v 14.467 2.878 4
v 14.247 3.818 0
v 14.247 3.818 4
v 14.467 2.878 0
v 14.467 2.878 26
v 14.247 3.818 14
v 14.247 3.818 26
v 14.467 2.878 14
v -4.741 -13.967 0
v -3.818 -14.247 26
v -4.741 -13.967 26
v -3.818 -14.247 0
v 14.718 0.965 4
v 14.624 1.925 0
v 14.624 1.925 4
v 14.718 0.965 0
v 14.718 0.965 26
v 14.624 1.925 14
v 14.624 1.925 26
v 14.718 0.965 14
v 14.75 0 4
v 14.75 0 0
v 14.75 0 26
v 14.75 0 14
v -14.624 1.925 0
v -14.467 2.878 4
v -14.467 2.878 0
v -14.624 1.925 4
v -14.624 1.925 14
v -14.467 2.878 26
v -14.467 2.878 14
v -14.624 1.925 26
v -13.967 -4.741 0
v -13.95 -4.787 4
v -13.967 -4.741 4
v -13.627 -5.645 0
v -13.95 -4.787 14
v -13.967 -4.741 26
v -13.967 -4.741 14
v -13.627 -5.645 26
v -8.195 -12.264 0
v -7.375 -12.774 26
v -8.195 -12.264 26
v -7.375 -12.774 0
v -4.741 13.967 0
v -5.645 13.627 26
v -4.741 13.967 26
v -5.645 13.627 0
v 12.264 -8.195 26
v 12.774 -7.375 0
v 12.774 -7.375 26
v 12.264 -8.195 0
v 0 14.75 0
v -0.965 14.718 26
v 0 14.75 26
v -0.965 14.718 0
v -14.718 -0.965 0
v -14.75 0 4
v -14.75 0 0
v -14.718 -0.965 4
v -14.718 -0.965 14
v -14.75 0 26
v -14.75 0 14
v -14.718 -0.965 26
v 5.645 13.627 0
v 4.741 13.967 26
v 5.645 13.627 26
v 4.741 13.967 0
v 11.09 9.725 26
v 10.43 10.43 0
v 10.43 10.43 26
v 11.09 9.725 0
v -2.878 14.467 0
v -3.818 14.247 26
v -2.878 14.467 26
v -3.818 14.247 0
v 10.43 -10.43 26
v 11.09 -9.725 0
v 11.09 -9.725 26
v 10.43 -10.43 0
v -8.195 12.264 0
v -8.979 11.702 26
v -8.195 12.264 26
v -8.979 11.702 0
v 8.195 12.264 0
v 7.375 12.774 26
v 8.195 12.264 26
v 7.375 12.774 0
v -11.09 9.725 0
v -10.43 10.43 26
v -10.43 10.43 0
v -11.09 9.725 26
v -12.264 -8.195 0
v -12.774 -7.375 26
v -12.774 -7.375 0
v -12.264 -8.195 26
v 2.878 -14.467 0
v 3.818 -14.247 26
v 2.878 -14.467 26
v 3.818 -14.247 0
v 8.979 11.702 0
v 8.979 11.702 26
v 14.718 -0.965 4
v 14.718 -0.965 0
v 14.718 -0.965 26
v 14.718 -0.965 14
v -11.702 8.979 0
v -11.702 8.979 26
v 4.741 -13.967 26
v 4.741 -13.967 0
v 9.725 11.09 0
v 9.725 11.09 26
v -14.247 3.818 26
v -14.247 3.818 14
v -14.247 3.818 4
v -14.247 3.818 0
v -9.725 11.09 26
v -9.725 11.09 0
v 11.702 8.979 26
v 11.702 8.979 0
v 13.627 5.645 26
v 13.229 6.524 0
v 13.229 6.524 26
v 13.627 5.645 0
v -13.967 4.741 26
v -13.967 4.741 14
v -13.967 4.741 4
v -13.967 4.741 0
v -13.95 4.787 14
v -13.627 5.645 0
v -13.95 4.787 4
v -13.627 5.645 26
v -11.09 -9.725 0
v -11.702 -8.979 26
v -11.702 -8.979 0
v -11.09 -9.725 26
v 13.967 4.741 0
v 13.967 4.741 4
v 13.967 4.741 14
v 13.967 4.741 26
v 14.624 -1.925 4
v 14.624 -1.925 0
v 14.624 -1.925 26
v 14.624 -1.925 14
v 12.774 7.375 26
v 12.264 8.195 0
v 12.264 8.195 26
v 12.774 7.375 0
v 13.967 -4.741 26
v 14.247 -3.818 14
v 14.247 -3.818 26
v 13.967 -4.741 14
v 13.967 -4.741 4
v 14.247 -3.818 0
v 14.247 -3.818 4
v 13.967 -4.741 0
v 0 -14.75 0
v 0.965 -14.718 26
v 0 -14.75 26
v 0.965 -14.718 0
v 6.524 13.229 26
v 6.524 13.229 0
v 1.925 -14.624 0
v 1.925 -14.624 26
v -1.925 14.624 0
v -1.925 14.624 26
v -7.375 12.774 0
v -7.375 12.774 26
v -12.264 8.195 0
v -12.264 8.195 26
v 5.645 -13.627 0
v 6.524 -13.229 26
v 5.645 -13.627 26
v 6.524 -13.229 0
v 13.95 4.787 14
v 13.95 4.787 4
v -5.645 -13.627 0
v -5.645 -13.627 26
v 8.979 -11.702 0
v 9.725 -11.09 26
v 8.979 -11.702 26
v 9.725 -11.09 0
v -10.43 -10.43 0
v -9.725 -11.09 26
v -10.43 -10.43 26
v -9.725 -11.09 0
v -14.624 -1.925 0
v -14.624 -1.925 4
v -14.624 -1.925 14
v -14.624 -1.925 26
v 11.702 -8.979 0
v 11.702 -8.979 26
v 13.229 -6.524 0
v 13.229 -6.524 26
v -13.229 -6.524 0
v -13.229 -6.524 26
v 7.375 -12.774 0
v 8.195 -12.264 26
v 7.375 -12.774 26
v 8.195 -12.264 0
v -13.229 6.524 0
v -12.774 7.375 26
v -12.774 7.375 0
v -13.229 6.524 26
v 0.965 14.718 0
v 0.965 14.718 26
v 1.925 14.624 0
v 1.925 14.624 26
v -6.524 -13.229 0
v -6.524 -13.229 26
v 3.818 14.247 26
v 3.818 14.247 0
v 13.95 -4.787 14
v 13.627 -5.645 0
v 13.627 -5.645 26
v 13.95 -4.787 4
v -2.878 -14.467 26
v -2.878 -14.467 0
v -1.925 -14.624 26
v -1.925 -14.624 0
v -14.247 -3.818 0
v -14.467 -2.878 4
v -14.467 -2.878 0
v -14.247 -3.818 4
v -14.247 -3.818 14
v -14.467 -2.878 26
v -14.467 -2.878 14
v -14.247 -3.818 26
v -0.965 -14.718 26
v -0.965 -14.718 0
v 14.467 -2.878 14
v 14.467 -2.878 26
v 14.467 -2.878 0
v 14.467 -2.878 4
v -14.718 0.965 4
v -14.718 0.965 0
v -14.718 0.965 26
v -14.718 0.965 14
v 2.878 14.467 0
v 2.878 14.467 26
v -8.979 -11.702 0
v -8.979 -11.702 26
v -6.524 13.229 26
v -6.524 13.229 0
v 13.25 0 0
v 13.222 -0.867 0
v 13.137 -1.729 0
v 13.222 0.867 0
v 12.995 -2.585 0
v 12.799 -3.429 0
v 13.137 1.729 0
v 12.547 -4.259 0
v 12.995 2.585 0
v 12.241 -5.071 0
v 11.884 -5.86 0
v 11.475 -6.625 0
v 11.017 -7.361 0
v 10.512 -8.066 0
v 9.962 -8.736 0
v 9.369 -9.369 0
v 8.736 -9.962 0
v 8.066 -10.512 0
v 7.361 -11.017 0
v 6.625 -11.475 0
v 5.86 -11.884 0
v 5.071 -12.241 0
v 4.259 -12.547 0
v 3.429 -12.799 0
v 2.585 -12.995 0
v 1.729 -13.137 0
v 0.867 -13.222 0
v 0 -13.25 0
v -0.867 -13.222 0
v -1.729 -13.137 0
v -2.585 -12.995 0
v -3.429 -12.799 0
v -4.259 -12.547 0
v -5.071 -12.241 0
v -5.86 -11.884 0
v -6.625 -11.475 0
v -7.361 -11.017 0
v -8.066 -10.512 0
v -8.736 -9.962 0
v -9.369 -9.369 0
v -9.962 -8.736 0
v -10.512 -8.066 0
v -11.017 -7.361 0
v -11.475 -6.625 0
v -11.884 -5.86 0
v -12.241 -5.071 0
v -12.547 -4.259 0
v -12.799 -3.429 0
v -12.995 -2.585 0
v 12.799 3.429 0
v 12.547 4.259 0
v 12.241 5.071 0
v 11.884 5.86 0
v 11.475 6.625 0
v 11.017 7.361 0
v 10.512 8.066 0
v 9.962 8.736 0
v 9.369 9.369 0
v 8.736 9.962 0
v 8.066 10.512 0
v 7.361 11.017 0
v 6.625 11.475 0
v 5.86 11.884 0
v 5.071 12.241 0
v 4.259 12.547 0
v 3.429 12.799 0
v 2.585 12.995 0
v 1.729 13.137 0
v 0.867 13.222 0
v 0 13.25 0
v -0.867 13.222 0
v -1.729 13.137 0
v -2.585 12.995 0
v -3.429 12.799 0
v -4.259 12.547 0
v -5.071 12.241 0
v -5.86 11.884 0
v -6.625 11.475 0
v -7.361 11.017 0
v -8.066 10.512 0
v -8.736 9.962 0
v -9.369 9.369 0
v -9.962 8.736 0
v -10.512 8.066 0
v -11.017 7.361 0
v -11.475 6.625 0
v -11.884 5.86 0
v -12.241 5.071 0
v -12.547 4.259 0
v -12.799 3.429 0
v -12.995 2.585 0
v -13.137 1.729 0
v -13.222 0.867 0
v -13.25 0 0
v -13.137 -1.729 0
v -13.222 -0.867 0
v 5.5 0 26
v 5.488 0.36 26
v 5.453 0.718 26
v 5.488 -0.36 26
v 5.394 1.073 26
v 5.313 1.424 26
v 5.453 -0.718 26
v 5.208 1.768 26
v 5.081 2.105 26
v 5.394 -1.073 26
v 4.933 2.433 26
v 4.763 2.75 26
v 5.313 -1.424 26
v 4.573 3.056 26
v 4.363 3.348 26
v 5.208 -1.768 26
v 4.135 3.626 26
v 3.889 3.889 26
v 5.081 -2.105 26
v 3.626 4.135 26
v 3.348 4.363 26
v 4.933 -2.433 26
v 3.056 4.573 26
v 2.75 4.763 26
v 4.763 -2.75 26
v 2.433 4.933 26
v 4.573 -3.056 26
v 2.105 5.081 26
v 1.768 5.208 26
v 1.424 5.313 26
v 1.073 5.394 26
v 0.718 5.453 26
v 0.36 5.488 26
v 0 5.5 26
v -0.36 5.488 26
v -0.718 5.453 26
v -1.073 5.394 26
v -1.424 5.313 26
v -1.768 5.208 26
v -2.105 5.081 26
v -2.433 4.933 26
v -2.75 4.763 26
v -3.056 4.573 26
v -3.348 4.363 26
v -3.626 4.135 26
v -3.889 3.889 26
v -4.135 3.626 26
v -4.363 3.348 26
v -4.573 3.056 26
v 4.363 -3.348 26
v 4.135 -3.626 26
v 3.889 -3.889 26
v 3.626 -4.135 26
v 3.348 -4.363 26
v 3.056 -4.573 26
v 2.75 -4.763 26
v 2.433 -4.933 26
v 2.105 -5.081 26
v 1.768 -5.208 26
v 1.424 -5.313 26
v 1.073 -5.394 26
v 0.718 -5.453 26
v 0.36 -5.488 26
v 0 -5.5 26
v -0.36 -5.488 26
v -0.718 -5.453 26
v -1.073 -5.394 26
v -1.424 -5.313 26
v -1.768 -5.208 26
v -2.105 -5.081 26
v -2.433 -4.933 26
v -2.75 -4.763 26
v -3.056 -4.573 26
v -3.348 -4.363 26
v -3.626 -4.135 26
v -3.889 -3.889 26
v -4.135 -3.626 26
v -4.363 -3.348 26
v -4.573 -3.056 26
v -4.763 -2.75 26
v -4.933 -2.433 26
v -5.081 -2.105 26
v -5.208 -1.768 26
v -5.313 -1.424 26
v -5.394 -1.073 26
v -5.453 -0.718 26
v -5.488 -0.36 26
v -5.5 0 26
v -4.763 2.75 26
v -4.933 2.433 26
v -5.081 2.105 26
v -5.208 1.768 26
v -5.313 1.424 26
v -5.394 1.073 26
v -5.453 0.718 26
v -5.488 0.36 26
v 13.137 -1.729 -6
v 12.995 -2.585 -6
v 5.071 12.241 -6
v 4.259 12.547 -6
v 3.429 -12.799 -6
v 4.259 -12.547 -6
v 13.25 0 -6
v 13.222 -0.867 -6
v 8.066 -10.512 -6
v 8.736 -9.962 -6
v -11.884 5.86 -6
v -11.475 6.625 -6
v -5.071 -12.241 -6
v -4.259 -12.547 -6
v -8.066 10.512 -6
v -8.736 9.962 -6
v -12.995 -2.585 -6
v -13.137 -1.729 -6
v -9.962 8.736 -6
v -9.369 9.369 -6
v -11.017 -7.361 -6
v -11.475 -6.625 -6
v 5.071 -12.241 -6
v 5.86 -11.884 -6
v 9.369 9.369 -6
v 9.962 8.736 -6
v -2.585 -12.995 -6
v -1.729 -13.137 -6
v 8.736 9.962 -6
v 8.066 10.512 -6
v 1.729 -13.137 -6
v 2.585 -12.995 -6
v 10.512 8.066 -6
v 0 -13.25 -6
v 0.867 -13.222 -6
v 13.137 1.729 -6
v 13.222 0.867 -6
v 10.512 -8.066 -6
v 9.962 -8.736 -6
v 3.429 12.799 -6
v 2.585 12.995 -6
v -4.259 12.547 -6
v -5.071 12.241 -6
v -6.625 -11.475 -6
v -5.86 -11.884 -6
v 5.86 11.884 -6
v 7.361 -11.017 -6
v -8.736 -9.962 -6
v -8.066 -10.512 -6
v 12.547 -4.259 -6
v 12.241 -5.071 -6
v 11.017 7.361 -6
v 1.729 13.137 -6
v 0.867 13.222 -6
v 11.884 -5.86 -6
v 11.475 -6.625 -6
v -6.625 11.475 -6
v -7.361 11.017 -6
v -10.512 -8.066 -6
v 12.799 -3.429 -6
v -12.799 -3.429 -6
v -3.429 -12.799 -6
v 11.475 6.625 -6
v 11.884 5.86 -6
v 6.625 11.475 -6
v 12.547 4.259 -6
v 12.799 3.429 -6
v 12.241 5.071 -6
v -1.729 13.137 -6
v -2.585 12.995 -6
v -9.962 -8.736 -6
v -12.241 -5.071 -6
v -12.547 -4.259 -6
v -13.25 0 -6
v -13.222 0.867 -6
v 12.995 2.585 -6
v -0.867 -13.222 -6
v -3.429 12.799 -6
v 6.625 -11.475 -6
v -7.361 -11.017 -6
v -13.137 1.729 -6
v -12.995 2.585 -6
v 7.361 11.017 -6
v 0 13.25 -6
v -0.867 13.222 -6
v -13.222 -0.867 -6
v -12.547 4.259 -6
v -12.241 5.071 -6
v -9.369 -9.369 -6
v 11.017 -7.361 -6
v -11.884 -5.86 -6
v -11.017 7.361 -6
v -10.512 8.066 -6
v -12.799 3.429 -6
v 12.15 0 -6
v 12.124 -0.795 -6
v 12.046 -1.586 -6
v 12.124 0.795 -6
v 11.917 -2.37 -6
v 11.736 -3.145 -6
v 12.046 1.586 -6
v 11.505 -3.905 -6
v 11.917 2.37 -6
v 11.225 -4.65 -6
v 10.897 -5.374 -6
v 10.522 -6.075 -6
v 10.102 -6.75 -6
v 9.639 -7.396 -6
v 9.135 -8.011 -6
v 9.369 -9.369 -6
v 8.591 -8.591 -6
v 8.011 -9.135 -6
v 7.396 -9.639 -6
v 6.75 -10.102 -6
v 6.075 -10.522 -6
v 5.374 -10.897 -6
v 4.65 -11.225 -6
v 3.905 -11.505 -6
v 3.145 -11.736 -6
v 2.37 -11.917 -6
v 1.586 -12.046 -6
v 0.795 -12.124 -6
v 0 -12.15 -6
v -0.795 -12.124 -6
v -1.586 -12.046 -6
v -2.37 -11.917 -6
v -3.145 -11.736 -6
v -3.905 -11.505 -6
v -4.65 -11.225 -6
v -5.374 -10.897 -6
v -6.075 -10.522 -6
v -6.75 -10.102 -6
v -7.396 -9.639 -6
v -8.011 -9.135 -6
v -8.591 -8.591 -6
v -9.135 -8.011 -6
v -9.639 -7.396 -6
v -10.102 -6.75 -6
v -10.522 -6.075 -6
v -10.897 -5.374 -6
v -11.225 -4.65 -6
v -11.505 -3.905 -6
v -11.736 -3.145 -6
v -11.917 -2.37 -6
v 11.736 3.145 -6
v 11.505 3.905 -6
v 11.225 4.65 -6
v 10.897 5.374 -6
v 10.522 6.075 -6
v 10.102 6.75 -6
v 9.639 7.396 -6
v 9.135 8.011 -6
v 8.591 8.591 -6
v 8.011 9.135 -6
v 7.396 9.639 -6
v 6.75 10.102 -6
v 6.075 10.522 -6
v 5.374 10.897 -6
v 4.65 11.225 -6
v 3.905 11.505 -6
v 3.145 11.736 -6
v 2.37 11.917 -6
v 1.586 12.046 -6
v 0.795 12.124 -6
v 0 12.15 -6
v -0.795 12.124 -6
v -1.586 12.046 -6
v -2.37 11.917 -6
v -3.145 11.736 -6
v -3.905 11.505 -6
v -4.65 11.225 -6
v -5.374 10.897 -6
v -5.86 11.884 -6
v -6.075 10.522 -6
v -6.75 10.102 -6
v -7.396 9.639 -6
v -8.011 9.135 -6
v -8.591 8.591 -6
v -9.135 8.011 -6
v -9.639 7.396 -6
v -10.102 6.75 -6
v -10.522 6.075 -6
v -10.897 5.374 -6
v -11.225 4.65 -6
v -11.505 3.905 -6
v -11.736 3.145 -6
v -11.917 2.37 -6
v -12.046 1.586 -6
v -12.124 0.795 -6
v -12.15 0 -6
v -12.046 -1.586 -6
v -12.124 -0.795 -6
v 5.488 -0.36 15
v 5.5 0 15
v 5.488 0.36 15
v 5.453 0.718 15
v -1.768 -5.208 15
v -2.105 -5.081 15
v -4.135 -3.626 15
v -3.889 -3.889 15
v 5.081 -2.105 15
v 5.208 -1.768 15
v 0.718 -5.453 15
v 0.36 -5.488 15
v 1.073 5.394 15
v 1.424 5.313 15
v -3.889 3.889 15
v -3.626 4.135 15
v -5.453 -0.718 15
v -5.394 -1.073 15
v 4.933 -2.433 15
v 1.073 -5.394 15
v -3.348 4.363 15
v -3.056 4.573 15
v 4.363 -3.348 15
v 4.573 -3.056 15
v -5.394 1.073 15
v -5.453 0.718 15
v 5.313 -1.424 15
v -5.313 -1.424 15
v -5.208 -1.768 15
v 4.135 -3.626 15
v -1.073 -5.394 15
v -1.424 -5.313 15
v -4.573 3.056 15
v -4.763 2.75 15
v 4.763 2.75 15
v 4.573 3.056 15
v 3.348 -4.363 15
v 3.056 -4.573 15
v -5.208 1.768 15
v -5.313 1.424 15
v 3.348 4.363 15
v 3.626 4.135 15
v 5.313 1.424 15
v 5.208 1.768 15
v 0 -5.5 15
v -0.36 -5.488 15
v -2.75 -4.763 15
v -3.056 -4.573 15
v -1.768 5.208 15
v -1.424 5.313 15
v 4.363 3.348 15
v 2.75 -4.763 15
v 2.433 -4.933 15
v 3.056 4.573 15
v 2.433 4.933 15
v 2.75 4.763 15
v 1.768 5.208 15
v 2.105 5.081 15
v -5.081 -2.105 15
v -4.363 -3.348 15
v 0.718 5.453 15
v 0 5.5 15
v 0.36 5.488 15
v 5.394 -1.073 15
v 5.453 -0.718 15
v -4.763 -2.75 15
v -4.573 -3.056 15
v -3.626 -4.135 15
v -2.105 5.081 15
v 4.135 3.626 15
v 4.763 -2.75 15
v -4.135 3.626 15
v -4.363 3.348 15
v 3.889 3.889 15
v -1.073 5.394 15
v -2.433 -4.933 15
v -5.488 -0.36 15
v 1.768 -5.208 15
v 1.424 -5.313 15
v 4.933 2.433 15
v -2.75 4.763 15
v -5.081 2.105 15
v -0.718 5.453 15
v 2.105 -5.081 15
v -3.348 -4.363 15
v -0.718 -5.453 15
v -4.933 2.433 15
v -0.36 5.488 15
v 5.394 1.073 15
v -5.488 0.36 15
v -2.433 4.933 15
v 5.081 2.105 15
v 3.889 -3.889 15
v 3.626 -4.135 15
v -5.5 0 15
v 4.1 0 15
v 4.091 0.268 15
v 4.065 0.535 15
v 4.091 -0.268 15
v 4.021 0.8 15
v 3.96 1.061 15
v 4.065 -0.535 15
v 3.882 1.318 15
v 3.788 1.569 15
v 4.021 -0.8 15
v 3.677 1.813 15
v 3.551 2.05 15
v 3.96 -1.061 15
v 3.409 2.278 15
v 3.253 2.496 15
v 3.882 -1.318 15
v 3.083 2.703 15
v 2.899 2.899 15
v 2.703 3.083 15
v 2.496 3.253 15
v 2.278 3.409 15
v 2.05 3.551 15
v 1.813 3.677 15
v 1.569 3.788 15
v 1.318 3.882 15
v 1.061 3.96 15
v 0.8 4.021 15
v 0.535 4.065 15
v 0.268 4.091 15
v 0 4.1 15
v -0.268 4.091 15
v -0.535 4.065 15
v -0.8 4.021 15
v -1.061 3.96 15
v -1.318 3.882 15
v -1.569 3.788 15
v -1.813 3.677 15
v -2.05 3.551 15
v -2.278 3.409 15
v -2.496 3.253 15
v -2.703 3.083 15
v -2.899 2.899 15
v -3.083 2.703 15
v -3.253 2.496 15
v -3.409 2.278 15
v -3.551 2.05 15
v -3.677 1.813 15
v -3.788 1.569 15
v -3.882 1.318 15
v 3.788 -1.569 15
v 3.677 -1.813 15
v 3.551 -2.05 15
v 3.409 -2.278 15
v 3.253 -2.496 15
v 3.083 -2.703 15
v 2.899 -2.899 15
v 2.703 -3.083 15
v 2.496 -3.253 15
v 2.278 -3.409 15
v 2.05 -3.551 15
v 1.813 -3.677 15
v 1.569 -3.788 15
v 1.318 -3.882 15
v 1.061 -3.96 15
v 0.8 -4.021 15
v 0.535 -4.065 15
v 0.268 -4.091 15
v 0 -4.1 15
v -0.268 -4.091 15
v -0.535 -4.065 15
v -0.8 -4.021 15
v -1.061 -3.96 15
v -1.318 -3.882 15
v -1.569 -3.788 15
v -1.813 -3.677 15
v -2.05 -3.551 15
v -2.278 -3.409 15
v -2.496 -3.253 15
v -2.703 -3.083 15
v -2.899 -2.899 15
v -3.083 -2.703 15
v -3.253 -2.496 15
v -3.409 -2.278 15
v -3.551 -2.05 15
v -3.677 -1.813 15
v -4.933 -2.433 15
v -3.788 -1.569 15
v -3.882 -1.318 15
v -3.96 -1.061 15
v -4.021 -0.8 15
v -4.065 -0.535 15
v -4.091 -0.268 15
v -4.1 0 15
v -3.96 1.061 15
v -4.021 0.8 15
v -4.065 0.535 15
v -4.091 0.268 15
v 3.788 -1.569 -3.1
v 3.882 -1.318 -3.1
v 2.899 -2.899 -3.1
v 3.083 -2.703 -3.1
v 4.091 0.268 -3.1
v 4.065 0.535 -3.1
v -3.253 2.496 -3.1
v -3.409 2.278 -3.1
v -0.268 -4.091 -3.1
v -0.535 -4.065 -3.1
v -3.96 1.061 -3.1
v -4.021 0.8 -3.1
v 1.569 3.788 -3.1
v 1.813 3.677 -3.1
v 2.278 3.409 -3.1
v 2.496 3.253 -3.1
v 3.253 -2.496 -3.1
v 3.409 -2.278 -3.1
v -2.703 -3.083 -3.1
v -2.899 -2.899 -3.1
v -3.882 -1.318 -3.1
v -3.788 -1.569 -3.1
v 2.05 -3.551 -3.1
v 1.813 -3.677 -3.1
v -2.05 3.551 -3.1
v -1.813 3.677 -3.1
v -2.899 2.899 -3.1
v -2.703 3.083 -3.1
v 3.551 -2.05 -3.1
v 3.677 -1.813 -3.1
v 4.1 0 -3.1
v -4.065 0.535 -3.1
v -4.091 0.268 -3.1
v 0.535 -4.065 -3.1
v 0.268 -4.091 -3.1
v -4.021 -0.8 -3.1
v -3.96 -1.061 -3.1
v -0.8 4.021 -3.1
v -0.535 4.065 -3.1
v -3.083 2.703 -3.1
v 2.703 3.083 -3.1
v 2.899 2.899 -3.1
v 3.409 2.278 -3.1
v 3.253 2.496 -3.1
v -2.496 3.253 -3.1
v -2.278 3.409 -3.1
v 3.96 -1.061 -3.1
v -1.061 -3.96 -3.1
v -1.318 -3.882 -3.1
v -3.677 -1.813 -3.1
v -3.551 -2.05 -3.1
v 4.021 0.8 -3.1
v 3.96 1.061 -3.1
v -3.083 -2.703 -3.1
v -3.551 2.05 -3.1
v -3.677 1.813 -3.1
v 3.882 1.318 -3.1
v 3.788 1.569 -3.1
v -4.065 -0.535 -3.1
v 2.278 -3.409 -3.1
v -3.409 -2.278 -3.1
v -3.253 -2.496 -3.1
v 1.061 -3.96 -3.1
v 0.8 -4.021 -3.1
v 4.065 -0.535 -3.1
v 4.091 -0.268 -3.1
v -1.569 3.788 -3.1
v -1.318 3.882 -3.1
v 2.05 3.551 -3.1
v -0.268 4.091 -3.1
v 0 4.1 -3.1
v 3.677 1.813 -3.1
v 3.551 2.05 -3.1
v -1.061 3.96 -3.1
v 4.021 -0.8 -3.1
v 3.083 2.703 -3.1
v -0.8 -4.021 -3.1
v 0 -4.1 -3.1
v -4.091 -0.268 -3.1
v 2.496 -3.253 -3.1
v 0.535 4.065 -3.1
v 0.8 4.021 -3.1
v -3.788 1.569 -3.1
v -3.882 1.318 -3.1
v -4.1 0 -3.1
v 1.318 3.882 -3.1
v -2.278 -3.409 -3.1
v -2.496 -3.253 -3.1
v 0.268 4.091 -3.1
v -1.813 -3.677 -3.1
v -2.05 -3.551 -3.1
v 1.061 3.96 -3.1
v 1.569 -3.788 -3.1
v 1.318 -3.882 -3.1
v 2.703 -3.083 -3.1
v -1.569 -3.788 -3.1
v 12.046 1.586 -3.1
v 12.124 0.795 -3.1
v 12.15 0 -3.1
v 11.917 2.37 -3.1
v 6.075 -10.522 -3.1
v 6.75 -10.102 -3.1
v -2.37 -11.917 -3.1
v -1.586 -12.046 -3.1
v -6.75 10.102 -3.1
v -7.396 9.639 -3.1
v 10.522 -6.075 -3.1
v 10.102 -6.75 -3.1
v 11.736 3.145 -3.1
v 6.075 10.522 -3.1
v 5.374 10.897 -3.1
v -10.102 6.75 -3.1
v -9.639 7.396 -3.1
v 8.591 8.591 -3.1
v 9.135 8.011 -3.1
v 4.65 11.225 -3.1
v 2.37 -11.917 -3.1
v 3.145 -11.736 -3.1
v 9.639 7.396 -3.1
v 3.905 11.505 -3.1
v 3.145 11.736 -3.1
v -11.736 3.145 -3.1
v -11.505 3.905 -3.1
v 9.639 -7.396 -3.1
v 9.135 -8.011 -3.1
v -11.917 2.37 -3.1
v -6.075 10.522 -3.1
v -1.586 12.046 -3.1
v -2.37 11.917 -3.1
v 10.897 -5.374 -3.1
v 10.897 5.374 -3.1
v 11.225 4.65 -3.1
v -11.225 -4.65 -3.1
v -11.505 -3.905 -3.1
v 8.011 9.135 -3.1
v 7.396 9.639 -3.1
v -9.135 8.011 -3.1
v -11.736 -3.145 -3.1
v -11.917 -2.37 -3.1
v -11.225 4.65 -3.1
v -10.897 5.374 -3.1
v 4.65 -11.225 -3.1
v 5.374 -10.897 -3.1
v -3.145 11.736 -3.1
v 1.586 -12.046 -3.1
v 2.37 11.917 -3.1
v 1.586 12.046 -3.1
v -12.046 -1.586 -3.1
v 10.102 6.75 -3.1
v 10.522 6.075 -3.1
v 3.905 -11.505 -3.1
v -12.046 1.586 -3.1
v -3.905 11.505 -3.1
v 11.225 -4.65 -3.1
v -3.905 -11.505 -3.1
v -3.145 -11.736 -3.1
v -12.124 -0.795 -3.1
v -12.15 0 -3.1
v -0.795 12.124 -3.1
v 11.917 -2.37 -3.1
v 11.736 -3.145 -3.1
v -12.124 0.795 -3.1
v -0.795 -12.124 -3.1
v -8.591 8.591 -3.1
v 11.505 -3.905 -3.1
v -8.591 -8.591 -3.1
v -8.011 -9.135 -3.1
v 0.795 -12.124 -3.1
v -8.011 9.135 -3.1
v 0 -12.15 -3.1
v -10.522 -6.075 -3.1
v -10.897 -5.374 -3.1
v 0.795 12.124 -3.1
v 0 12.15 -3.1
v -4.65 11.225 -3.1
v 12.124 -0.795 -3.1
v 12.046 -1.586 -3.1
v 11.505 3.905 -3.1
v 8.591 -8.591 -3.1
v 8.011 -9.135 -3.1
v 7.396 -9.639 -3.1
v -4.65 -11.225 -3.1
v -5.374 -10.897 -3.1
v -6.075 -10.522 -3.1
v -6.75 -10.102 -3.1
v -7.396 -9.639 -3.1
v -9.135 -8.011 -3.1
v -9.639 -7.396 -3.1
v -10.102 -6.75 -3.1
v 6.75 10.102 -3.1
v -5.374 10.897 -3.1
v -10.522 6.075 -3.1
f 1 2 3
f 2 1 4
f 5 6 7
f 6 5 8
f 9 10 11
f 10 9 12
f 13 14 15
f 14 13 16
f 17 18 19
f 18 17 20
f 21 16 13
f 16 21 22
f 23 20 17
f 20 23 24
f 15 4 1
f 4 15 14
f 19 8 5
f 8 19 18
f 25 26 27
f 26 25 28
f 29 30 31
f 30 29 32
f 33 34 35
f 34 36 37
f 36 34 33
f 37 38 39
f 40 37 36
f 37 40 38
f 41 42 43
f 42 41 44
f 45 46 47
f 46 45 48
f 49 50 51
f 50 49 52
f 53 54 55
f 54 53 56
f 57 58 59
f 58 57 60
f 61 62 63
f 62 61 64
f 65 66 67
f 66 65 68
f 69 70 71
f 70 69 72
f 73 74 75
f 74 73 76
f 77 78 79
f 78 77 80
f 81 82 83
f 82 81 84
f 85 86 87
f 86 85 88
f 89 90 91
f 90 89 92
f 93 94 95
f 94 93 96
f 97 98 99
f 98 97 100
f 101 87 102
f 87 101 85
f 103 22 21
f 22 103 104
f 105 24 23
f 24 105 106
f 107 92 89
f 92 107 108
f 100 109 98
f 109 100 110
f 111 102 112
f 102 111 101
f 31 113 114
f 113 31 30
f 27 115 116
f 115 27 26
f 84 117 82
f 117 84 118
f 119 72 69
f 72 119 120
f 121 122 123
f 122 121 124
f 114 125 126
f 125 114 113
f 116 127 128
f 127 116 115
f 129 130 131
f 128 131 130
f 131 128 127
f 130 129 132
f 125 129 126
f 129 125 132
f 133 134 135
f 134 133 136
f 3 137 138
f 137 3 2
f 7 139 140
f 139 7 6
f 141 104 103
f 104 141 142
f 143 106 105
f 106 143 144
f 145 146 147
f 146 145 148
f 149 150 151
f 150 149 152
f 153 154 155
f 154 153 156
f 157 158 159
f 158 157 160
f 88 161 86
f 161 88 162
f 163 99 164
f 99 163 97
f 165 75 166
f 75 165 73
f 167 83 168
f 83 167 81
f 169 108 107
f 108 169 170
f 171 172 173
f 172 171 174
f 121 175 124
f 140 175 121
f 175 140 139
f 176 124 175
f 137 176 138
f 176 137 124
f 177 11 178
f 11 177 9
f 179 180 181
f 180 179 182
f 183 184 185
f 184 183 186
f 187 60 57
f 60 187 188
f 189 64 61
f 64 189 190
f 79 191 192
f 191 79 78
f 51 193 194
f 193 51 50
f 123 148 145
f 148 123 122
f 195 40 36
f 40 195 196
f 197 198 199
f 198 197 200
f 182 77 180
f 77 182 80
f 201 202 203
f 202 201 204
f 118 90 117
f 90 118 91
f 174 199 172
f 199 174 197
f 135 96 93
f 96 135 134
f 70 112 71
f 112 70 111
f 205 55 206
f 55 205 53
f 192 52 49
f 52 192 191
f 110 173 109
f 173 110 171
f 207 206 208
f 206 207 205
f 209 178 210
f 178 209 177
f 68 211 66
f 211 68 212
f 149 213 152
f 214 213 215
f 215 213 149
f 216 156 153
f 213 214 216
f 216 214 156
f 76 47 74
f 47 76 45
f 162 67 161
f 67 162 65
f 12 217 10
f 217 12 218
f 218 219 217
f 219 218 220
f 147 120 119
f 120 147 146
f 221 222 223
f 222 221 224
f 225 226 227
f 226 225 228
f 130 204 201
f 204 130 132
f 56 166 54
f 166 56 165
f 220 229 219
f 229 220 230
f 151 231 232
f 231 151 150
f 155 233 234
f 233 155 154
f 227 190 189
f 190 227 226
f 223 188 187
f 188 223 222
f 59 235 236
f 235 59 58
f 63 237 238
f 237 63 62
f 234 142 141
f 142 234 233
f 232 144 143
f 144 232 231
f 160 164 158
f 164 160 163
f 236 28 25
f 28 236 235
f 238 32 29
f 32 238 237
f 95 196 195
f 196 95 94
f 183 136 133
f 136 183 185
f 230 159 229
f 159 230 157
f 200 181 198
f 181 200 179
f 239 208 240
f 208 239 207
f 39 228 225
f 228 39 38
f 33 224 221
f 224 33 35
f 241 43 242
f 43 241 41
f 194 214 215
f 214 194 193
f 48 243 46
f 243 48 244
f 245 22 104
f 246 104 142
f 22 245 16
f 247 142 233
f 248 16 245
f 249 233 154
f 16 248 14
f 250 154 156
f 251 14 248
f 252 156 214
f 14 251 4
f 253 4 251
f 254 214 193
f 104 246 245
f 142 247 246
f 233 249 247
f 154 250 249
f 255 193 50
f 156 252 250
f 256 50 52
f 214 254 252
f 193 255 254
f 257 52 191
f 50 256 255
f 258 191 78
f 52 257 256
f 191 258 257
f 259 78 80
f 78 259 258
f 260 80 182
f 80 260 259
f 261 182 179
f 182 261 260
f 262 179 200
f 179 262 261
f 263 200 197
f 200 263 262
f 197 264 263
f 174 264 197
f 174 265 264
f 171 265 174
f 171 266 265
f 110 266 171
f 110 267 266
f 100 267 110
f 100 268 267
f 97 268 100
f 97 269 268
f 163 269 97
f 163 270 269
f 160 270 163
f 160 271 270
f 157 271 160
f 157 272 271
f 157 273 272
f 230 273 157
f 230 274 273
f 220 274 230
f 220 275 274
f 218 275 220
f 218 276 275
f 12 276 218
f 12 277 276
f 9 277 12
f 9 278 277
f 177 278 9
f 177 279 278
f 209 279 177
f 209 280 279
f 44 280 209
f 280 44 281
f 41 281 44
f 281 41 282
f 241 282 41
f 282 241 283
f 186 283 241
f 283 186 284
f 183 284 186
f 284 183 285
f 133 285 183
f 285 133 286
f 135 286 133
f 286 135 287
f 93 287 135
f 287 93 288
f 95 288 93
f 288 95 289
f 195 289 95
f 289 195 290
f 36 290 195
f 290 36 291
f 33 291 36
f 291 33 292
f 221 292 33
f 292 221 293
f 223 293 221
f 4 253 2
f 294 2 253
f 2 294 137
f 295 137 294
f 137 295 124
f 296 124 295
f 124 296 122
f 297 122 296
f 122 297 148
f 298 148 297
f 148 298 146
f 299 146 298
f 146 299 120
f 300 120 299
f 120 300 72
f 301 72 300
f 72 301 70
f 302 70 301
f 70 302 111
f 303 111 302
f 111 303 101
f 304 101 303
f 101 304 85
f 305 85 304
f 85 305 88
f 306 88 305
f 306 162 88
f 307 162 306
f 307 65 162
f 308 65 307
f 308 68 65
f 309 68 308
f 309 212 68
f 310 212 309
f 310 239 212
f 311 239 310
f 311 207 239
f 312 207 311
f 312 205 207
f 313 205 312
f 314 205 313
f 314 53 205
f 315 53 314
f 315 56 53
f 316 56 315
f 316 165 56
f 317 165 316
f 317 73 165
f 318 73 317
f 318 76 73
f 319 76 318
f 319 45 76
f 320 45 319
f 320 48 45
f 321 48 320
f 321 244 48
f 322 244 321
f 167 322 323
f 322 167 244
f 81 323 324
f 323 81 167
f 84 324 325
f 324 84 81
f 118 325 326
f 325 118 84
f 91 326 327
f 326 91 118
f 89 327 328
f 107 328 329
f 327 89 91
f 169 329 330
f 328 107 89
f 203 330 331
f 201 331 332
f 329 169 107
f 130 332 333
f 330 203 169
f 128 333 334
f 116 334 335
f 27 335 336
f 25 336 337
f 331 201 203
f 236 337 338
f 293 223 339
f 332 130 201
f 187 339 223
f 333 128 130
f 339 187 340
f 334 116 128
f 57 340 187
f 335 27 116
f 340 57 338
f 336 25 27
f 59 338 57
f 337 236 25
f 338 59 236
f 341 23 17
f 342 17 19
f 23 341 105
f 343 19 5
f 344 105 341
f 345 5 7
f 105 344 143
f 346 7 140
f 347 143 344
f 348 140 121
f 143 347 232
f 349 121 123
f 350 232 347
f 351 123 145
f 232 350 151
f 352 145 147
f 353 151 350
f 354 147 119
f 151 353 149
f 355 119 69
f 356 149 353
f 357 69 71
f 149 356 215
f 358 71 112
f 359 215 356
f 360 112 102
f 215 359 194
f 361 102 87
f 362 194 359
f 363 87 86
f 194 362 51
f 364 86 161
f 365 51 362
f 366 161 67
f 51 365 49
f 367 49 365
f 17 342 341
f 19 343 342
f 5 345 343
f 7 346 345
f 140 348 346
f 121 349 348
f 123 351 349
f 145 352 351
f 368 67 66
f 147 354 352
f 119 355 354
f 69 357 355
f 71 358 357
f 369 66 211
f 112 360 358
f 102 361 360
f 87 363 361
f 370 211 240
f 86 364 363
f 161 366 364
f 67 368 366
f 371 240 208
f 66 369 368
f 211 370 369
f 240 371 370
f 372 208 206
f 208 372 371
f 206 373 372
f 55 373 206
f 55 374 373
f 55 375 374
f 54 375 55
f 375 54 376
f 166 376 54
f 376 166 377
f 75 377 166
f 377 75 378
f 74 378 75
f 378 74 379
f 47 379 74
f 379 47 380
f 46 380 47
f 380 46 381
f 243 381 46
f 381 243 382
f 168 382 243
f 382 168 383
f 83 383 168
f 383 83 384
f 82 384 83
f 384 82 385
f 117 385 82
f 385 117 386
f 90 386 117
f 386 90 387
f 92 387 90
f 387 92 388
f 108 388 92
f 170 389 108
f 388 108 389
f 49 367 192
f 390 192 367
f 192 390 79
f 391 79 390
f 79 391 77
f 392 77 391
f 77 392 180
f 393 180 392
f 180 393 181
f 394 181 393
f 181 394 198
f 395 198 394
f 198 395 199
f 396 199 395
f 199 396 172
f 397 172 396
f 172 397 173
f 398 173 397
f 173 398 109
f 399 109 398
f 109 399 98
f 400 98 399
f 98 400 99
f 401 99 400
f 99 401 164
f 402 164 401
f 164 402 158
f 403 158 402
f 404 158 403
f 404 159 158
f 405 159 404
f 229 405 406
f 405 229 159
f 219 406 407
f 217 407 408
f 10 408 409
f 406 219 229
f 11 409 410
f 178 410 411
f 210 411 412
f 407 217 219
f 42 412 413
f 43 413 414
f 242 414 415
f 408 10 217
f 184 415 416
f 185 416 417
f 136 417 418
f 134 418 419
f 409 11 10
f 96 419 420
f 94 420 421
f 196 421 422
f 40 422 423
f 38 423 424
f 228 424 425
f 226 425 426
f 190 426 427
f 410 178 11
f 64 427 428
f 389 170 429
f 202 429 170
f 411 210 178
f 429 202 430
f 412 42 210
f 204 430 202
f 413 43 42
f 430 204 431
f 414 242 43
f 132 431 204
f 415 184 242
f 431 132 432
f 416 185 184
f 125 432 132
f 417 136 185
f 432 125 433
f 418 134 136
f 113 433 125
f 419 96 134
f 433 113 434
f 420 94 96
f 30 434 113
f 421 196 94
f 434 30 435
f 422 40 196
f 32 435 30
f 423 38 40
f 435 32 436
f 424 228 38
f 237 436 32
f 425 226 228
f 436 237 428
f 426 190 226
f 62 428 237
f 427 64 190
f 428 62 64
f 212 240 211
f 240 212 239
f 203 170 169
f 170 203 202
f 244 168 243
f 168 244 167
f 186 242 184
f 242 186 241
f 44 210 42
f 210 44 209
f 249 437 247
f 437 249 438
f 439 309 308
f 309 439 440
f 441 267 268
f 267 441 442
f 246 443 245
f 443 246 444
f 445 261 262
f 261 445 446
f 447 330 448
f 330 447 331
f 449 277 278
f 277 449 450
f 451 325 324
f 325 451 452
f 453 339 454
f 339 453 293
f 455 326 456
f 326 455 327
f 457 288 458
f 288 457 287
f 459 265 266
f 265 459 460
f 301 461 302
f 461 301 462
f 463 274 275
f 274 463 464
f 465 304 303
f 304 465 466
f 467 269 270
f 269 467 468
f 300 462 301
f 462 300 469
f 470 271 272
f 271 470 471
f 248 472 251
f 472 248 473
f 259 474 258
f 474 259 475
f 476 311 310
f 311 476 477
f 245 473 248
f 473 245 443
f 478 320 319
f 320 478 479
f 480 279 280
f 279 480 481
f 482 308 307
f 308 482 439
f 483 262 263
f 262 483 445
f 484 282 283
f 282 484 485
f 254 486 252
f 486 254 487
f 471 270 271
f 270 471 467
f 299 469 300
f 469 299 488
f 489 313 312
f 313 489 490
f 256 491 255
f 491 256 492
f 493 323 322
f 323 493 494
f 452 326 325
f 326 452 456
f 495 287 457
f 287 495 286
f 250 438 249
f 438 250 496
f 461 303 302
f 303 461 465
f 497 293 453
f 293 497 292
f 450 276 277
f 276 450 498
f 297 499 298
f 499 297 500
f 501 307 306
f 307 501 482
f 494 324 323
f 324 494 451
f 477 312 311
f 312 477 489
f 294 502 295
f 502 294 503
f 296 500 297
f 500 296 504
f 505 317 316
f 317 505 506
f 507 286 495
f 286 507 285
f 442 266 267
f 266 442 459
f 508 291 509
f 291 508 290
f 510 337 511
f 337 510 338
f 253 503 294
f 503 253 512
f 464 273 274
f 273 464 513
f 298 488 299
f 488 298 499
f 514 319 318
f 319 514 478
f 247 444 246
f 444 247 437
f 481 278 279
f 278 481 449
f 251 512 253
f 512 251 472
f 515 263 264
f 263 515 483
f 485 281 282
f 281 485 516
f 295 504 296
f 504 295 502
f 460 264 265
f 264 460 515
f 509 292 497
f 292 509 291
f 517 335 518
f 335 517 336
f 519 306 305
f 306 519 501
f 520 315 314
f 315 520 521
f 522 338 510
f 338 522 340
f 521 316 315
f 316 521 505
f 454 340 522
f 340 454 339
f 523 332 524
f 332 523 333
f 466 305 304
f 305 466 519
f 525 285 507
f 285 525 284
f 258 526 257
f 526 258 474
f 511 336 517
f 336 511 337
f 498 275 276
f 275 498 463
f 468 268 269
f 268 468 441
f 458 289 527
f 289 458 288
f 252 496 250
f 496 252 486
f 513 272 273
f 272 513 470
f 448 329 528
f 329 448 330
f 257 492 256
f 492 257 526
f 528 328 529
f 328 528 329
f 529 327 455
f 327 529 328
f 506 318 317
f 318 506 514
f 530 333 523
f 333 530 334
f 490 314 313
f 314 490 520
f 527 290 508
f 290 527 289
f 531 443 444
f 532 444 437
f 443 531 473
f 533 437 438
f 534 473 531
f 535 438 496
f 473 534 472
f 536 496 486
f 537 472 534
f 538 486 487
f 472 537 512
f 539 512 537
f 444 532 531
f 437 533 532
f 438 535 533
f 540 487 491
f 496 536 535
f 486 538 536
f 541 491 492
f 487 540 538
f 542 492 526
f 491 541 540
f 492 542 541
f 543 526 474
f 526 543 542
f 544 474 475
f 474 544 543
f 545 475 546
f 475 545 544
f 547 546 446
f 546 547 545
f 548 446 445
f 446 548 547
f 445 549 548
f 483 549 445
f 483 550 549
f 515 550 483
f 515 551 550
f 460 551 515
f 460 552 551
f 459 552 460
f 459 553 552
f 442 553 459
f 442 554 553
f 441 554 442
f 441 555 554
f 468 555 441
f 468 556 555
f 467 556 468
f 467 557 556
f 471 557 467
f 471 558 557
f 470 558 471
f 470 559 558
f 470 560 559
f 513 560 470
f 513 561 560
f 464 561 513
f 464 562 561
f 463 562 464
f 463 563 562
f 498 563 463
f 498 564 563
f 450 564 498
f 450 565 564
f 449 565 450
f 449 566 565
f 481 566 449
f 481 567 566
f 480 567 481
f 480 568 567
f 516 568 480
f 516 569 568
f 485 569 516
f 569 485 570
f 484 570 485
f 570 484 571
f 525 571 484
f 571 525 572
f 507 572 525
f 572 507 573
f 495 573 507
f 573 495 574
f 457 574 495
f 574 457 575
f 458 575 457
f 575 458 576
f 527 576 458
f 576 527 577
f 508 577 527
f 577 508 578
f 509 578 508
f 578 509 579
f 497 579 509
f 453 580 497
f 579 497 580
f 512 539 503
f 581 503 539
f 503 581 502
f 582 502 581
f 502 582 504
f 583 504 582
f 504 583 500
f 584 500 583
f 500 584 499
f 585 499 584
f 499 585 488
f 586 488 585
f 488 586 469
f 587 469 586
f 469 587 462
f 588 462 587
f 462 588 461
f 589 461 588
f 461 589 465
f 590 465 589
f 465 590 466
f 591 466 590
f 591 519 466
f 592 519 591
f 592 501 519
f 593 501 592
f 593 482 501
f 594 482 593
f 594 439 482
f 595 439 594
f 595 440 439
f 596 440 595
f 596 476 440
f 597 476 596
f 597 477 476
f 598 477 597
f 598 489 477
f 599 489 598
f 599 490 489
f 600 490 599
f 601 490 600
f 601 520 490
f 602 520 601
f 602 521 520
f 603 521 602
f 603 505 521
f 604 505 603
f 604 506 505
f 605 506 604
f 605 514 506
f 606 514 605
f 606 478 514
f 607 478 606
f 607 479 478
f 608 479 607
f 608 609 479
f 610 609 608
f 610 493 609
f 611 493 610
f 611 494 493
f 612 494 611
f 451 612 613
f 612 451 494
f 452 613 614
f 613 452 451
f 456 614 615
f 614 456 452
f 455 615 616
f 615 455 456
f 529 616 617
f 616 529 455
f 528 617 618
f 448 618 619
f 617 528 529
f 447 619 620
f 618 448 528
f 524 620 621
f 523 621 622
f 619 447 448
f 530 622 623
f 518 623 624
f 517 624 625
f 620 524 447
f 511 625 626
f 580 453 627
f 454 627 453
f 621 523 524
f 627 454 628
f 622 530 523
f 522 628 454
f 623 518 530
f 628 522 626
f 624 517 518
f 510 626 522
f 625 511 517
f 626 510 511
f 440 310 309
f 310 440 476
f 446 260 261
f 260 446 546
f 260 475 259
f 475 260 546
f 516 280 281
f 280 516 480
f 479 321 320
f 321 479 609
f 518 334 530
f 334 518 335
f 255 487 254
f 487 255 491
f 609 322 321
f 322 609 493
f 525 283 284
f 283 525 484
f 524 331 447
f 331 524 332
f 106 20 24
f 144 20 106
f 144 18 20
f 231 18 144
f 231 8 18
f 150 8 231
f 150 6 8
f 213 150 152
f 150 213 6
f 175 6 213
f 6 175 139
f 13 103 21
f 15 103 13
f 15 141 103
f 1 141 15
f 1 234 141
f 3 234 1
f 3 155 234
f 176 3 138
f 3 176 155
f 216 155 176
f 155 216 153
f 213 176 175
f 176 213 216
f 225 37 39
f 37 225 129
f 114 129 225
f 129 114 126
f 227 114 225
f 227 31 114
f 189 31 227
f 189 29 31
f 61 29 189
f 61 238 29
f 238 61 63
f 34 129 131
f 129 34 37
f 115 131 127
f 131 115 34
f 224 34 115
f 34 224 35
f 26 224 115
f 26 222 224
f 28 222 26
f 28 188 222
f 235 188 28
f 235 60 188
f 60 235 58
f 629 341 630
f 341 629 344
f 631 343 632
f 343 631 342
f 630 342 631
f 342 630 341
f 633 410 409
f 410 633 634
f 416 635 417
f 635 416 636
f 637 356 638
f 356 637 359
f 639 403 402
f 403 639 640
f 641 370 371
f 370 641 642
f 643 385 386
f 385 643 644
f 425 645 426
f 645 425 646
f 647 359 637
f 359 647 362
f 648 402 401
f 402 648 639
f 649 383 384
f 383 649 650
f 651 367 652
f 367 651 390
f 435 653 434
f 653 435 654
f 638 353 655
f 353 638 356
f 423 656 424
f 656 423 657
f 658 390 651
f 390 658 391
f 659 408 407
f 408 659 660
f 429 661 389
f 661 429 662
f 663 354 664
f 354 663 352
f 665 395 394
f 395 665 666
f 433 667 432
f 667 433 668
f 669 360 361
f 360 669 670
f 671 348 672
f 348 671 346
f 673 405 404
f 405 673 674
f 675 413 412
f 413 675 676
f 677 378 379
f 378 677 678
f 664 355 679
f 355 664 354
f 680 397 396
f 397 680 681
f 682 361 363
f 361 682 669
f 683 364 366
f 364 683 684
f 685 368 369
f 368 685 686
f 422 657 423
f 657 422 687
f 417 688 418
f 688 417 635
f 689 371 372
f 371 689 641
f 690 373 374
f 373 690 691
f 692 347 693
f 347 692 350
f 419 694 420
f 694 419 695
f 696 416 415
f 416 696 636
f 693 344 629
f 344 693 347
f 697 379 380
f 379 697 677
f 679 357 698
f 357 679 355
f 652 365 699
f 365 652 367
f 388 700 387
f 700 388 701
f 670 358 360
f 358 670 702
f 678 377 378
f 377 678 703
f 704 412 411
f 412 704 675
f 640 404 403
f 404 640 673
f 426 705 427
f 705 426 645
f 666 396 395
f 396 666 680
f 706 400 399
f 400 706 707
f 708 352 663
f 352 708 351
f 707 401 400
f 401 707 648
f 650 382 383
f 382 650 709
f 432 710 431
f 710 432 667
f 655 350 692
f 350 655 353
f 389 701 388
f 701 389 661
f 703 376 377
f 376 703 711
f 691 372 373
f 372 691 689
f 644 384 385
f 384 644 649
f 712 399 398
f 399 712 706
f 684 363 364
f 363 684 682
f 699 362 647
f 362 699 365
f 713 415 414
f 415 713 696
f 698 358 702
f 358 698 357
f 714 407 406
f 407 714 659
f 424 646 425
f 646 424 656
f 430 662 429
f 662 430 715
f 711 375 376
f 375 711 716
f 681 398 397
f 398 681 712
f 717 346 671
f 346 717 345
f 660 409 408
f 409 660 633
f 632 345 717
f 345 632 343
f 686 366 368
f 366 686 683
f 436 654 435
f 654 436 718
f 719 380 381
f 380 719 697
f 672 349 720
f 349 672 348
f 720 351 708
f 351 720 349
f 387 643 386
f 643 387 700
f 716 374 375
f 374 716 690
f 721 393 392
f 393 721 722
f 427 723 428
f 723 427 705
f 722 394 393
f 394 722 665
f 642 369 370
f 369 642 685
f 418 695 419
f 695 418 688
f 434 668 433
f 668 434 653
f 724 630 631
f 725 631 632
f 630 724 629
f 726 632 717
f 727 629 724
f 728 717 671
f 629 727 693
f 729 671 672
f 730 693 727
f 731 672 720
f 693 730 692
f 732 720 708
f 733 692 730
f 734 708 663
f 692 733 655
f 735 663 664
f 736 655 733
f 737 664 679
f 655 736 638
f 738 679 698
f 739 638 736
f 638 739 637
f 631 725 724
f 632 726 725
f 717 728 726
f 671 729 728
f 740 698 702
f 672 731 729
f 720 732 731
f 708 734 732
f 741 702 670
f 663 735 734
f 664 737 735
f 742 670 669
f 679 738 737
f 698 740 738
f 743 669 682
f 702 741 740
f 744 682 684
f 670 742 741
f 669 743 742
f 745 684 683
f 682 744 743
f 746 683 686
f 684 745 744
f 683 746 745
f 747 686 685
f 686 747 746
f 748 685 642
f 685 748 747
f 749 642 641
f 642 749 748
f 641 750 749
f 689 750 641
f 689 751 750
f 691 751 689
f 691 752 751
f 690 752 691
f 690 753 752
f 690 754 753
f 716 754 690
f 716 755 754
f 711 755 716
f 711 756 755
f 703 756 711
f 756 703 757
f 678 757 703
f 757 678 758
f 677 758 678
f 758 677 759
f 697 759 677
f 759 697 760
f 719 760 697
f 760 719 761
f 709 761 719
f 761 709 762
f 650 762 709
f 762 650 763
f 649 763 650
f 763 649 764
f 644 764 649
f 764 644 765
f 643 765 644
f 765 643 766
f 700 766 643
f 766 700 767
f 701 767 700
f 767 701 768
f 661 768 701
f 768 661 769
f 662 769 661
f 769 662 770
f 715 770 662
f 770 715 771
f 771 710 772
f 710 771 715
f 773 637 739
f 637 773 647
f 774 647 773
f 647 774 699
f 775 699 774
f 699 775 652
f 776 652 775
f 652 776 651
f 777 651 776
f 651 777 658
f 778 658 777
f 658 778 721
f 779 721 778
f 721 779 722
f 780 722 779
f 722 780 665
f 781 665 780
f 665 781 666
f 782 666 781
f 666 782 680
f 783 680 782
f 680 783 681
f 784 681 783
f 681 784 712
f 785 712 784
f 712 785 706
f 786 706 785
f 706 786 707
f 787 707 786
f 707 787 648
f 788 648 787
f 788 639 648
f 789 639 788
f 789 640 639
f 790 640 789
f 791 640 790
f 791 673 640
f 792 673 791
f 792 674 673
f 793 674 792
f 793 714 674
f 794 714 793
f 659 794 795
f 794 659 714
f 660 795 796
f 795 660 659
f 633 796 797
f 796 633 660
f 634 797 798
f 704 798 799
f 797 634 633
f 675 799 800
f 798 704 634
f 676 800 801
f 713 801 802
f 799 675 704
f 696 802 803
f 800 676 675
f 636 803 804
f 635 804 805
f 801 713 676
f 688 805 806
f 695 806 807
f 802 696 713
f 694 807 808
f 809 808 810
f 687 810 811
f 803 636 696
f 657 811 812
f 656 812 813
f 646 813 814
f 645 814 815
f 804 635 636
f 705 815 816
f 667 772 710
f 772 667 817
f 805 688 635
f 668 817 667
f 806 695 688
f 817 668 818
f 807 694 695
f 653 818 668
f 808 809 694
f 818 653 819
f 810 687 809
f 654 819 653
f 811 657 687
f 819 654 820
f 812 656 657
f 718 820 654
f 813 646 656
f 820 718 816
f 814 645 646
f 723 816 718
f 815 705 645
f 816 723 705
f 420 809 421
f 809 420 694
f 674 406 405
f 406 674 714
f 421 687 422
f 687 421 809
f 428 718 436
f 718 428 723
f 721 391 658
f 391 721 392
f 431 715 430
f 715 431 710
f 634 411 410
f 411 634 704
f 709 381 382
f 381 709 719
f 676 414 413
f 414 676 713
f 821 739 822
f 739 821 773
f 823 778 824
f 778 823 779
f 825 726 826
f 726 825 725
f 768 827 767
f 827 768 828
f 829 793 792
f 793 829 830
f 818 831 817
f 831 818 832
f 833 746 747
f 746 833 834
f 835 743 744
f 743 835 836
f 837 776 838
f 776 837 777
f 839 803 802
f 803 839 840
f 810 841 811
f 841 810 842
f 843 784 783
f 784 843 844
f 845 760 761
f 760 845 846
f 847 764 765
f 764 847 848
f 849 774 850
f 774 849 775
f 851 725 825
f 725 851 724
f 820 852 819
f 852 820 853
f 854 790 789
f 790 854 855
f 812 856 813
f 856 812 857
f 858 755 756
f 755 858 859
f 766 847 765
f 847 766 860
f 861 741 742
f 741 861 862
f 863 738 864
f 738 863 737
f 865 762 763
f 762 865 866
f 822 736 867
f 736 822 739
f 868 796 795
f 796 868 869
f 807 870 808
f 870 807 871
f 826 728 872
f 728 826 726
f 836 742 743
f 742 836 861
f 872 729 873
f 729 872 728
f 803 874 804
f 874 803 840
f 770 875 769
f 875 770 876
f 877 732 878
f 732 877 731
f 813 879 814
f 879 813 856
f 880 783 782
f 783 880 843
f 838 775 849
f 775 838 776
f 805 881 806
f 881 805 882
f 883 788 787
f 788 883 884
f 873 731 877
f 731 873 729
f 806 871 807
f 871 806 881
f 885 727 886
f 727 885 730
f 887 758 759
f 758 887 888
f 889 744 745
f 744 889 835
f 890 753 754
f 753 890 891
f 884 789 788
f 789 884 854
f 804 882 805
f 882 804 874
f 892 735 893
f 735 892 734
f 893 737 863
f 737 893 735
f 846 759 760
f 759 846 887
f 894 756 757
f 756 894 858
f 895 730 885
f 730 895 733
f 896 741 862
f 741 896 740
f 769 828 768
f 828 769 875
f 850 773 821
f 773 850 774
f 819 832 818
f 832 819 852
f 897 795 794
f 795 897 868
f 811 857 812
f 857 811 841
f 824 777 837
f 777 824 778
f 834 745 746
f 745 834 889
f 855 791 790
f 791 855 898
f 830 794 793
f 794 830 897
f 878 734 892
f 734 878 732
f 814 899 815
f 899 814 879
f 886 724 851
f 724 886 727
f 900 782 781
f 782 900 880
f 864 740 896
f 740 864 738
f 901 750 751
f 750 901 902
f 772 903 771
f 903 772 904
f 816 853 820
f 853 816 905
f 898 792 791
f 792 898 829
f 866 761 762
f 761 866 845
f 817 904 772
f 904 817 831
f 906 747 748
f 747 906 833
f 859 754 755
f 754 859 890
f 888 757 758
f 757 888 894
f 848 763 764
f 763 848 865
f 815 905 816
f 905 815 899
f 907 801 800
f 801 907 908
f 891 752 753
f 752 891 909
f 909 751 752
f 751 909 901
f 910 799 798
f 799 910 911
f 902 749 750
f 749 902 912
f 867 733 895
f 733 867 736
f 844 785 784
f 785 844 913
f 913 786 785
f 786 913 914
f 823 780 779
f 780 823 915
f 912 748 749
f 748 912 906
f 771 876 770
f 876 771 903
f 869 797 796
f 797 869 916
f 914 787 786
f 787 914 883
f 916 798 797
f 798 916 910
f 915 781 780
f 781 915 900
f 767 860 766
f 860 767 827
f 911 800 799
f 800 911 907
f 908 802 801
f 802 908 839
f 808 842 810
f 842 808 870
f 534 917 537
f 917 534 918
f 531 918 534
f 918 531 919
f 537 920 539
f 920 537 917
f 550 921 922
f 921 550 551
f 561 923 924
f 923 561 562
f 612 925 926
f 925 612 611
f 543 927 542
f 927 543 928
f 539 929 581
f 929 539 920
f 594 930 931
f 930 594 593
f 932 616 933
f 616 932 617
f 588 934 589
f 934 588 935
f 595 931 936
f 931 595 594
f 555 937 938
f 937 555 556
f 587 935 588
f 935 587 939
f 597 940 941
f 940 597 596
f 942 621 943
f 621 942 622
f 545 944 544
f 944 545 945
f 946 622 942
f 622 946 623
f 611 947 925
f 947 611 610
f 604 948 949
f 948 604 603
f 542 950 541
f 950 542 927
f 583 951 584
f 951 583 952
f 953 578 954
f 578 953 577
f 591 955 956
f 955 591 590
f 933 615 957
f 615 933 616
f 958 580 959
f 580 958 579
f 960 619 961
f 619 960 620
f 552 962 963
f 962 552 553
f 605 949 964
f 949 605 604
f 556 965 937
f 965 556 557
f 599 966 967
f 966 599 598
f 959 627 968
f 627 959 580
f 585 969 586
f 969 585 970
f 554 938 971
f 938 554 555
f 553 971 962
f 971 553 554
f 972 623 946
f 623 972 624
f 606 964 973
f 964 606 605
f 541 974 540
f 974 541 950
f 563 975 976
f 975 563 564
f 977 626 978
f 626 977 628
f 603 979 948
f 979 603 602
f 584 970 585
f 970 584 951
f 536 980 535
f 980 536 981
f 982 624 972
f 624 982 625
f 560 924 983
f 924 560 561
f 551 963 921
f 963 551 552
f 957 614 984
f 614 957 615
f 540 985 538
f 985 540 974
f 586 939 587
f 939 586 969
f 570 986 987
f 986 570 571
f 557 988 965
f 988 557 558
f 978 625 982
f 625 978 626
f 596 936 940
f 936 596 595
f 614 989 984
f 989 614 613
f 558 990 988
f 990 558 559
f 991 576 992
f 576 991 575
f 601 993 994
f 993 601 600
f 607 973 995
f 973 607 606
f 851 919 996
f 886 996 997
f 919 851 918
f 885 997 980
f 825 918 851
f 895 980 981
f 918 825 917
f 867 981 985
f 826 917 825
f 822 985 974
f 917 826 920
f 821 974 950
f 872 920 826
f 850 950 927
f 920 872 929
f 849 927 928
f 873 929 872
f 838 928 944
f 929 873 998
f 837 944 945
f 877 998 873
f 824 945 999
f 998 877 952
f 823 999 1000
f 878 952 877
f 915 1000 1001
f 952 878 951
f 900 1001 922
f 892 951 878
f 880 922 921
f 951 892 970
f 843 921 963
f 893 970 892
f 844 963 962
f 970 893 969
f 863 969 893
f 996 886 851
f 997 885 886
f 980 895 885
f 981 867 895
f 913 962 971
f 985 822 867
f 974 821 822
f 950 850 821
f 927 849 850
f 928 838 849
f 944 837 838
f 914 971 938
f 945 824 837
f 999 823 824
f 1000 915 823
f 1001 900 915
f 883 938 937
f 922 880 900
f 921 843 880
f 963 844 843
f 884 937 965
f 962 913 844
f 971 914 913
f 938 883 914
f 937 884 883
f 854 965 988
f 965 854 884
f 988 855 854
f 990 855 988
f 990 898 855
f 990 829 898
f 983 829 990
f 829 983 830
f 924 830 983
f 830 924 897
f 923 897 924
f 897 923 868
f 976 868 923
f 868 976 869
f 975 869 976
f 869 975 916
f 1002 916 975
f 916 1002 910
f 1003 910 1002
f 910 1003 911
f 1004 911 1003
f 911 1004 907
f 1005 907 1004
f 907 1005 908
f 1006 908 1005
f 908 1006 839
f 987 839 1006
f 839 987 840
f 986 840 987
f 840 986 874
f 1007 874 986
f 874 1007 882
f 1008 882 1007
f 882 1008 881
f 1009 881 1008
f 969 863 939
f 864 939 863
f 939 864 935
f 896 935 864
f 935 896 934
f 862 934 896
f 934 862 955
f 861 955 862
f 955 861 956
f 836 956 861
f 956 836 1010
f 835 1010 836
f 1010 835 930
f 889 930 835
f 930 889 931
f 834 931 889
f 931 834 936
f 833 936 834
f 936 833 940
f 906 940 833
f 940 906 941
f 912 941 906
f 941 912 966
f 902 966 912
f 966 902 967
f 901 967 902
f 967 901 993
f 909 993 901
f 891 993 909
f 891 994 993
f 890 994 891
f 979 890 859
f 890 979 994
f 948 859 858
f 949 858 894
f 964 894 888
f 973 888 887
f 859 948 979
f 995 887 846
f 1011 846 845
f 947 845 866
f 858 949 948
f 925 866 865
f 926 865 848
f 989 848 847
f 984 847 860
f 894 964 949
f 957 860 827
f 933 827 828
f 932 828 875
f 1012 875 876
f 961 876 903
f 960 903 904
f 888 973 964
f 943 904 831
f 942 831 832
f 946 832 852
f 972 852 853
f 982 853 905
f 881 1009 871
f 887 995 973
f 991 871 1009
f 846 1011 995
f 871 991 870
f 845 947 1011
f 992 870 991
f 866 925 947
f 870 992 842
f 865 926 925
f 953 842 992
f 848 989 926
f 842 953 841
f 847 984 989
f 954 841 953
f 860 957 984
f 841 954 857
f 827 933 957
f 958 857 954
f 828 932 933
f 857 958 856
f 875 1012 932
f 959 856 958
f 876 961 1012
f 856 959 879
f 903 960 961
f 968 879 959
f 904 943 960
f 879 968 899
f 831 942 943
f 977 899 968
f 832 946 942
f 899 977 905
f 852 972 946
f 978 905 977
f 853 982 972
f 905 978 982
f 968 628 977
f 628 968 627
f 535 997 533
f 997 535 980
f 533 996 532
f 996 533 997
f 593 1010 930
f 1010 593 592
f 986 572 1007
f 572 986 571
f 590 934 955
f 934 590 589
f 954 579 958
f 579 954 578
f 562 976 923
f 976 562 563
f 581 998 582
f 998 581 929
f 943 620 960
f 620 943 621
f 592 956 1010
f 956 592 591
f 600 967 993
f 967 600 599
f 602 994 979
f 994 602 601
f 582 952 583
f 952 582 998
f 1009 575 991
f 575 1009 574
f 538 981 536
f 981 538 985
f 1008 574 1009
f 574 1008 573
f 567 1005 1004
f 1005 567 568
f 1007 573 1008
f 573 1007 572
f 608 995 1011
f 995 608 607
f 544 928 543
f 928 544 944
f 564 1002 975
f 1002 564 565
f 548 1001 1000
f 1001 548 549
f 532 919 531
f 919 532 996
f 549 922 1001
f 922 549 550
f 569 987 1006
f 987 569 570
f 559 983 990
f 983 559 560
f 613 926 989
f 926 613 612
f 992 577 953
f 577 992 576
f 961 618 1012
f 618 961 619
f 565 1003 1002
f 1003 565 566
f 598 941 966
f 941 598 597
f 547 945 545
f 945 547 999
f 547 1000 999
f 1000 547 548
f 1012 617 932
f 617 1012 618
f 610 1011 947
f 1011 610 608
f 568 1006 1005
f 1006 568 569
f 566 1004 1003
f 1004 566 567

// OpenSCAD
// file: params.scad
// ===========================================================================
// CueCam - shared parameters
// Every printed part in this folder is driven from here. Change a number,
// re-export, reprint. Units: mm.
// ===========================================================================

/* [Cue geometry] */
CUE_LEN        = 1473.2;   // 58 in
JOINT1_X       = 482.6;    // 19 in - the "one third from the tip" station
SHAFT_DIA_AT_J1= 14.2;     // cue diameter where the collar starts

/* [Camera collar] -------------------------------------------------------- */
// POD_OD is THE parameter. 24 suits a 16 mm-wide custom PCB; use 29 for a
// de-cased RunCam Thumb Pro. Anything over 30 is unplayable - see docs.
POD_OD         = 24.0;
COLLAR_LEN     = 117.4;
COLLAR_WALL    = 2.0;
BAY_LEN        = 70.0;     // cartridge bay
BAY_DIA        = 19.2;     // bay bore
LEAD_IN        = 29.4;     // front blend length
LEAD_OUT       = 38.0;     // rear blend length

/* [Bayonet] -------------------------------------------------------------- */
BAY_LUGS       = 2;        // lugs, equally spaced
LUG_W          = 4.0;      // circumferential width
LUG_H          = 1.8;      // radial height
LUG_T          = 3.0;      // axial thickness
BAYONET_ANGLE  = 28;       // degrees of twist to lock
DETENT_R       = 0.55;     // detent bump radius
EJECT_TRAVEL   = 9.0;      // how far the spring pushes the cartridge out

/* [Cartridge] ------------------------------------------------------------ */
CART_OD        = 18.6;     // slides in BAY_DIA with the boot around it
CART_WALL      = 1.2;
PCB_W          = 16.0;
PCB_T          = 1.6;
PCB_L          = 58.0;
CELL_W         = 20.0;     // LiPo 402040
CELL_T         = 4.0;
CELL_L         = 40.0;
SD_W           = 11.0;
SD_T           = 1.0;

/* [Optics] --------------------------------------------------------------- */
LENS_R         = 11.0;     // lens height above the cue axis
LENS_BORE      = 8.0;      // M12 lens barrel clearance
WINDOW_W       = 6.0;
WINDOW_H       = 4.0;
WINDOW_T       = 0.8;
// Max nose-down tilt before the cue's own shaft blocks the axis is 0.67 deg
// (tools/optics.py). So: zero. The lens looks straight down the cue.
LENS_TILT      = 0.0;

/* [Butt] ----------------------------------------------------------------- */
BUTT_OD        = 29.5;
BUTT_WALL      = 1.4;
BOLT_BORE_DIA  = 8.0;      // 5/16-14 clearance
BOLT_BORE_LEN  = 190.0;    // long on purpose: halves the balance swing
CAP_LEN        = 26.0;
BUMPER_THREAD  = 12.0;     // M12x1, LEFT hand

/* [Grip] ----------------------------------------------------------------- */
GRIP_LEN       = 260.0;
GRIP_WALL      = 2.6;
GRIP_SPLIT     = 1.2;      // split width so it springs over the butt
INDEX_RIB_W    = 2.0;      // tells your hand where the lens is

/* [Tip] ------------------------------------------------------------------ */
TIP_DIA        = 9.5;
FERRULE_LEN    = 13.0;
FERRULE_BORE   = 6.3;
STUD           = "4-40";   // #4-40 UNC, 2.845 mm major

/* [Print] ---------------------------------------------------------------- */
FIT            = 0.20;     // clearance on sliding fits, PA6-CF on a P1S
PRESS          = 0.05;     // interference on bonded fits
$fn            = 96;
// file: lib.scad
// Small helpers shared by the CueCam parts.
include <params.scad>;

// A solid of revolution from a list of [x, radius] points.
module revolve(profile, fn = $fn) {
    rotate_extrude($fn = fn)
        polygon(concat([[0, profile[0][0]]],
                       [for (p = profile) [p[1], p[0]]],
                       [[0, profile[len(profile) - 1][0]]]));
}

// Smootherstep, the same blend the drawings use, so printed parts and
// drawings agree on the collar silhouette.
function blend(t) = let (u = max(0, min(1, t))) u*u*u*(u*(u*6 - 15) + 10);

function collar_r(x) =
      x <= LEAD_IN
    ? (SHAFT_DIA_AT_J1 + (POD_OD - SHAFT_DIA_AT_J1) * blend(x / LEAD_IN)) / 2
    : x <= COLLAR_LEN - LEAD_OUT
    ? POD_OD / 2
    : (POD_OD + (15.9 - POD_OD)
        * blend((x - (COLLAR_LEN - LEAD_OUT)) / LEAD_OUT)) / 2;

function collar_profile(n = 80) =
    [for (i = [0 : n]) let (x = COLLAR_LEN * i / n) [x, collar_r(x)]];

// A bayonet track cut: axial entry, then a circumferential run to a detent.
module bayonet_track(r, angle = BAYONET_ANGLE, w = LUG_W + 2*FIT,
                     t = LUG_T + 2*FIT, depth = LUG_H + FIT) {
    // axial entry slot
    translate([0, 0, -0.1]) rotate([0, 0, -w/2 / (PI*r) * 180])
        rotate_extrude(angle = w / (PI * r) * 180, $fn = 128)
            translate([r - depth, 0]) square([depth + 1, t + 2]);
    // circumferential run
    translate([0, 0, t - 0.1])
        rotate_extrude(angle = angle, $fn = 128)
            translate([r - depth, 0]) square([depth + 1, w]);
}

module knurl(r, h, n = 36, d = 0.6) {
    for (i = [0 : n - 1]) rotate([0, 0, i * 360 / n])
        translate([r, 0, 0]) cylinder(h = h, d = d, $fn = 8);
}
// main file
// ===========================================================================
// Butt cap. Stays captive on the cue; the rubber bumper threads into it with
// a LEFT hand thread so a hard shot tightens rather than loosens it.
// ===========================================================================
include <lib.scad>;

difference() {
    union() {
        cylinder(h = CAP_LEN, d1 = BUTT_OD, d2 = BUTT_OD);
        translate([0, 0, -6]) cylinder(h = 6, d = BUTT_OD - 2*BUTT_WALL - FIT);
    }
    // bumper thread pocket - tap M12x1 LH after printing, or bond a brass nut
    translate([0, 0, CAP_LEN - 11]) cylinder(h = 12, d = BUMPER_THREAD - 1.0);
    // 4 mm hex access straight through to the bolt stack
    translate([0, 0, -7]) cylinder(h = CAP_LEN + 8, d = BOLT_BORE_DIA + FIT);
    // grip sleeve shoulder: the sleeve is trapped here, no glue
    translate([0, 0, -6.1]) cylinder(h = 3, d = BUTT_OD - 2*GRIP_WALL);
    // spanner flats
    for (i = [0, 1]) rotate([0, 0, i * 180])
        translate([BUTT_OD/2 - 0.8, -6, 4]) cube([3, 12, 10]);
}
